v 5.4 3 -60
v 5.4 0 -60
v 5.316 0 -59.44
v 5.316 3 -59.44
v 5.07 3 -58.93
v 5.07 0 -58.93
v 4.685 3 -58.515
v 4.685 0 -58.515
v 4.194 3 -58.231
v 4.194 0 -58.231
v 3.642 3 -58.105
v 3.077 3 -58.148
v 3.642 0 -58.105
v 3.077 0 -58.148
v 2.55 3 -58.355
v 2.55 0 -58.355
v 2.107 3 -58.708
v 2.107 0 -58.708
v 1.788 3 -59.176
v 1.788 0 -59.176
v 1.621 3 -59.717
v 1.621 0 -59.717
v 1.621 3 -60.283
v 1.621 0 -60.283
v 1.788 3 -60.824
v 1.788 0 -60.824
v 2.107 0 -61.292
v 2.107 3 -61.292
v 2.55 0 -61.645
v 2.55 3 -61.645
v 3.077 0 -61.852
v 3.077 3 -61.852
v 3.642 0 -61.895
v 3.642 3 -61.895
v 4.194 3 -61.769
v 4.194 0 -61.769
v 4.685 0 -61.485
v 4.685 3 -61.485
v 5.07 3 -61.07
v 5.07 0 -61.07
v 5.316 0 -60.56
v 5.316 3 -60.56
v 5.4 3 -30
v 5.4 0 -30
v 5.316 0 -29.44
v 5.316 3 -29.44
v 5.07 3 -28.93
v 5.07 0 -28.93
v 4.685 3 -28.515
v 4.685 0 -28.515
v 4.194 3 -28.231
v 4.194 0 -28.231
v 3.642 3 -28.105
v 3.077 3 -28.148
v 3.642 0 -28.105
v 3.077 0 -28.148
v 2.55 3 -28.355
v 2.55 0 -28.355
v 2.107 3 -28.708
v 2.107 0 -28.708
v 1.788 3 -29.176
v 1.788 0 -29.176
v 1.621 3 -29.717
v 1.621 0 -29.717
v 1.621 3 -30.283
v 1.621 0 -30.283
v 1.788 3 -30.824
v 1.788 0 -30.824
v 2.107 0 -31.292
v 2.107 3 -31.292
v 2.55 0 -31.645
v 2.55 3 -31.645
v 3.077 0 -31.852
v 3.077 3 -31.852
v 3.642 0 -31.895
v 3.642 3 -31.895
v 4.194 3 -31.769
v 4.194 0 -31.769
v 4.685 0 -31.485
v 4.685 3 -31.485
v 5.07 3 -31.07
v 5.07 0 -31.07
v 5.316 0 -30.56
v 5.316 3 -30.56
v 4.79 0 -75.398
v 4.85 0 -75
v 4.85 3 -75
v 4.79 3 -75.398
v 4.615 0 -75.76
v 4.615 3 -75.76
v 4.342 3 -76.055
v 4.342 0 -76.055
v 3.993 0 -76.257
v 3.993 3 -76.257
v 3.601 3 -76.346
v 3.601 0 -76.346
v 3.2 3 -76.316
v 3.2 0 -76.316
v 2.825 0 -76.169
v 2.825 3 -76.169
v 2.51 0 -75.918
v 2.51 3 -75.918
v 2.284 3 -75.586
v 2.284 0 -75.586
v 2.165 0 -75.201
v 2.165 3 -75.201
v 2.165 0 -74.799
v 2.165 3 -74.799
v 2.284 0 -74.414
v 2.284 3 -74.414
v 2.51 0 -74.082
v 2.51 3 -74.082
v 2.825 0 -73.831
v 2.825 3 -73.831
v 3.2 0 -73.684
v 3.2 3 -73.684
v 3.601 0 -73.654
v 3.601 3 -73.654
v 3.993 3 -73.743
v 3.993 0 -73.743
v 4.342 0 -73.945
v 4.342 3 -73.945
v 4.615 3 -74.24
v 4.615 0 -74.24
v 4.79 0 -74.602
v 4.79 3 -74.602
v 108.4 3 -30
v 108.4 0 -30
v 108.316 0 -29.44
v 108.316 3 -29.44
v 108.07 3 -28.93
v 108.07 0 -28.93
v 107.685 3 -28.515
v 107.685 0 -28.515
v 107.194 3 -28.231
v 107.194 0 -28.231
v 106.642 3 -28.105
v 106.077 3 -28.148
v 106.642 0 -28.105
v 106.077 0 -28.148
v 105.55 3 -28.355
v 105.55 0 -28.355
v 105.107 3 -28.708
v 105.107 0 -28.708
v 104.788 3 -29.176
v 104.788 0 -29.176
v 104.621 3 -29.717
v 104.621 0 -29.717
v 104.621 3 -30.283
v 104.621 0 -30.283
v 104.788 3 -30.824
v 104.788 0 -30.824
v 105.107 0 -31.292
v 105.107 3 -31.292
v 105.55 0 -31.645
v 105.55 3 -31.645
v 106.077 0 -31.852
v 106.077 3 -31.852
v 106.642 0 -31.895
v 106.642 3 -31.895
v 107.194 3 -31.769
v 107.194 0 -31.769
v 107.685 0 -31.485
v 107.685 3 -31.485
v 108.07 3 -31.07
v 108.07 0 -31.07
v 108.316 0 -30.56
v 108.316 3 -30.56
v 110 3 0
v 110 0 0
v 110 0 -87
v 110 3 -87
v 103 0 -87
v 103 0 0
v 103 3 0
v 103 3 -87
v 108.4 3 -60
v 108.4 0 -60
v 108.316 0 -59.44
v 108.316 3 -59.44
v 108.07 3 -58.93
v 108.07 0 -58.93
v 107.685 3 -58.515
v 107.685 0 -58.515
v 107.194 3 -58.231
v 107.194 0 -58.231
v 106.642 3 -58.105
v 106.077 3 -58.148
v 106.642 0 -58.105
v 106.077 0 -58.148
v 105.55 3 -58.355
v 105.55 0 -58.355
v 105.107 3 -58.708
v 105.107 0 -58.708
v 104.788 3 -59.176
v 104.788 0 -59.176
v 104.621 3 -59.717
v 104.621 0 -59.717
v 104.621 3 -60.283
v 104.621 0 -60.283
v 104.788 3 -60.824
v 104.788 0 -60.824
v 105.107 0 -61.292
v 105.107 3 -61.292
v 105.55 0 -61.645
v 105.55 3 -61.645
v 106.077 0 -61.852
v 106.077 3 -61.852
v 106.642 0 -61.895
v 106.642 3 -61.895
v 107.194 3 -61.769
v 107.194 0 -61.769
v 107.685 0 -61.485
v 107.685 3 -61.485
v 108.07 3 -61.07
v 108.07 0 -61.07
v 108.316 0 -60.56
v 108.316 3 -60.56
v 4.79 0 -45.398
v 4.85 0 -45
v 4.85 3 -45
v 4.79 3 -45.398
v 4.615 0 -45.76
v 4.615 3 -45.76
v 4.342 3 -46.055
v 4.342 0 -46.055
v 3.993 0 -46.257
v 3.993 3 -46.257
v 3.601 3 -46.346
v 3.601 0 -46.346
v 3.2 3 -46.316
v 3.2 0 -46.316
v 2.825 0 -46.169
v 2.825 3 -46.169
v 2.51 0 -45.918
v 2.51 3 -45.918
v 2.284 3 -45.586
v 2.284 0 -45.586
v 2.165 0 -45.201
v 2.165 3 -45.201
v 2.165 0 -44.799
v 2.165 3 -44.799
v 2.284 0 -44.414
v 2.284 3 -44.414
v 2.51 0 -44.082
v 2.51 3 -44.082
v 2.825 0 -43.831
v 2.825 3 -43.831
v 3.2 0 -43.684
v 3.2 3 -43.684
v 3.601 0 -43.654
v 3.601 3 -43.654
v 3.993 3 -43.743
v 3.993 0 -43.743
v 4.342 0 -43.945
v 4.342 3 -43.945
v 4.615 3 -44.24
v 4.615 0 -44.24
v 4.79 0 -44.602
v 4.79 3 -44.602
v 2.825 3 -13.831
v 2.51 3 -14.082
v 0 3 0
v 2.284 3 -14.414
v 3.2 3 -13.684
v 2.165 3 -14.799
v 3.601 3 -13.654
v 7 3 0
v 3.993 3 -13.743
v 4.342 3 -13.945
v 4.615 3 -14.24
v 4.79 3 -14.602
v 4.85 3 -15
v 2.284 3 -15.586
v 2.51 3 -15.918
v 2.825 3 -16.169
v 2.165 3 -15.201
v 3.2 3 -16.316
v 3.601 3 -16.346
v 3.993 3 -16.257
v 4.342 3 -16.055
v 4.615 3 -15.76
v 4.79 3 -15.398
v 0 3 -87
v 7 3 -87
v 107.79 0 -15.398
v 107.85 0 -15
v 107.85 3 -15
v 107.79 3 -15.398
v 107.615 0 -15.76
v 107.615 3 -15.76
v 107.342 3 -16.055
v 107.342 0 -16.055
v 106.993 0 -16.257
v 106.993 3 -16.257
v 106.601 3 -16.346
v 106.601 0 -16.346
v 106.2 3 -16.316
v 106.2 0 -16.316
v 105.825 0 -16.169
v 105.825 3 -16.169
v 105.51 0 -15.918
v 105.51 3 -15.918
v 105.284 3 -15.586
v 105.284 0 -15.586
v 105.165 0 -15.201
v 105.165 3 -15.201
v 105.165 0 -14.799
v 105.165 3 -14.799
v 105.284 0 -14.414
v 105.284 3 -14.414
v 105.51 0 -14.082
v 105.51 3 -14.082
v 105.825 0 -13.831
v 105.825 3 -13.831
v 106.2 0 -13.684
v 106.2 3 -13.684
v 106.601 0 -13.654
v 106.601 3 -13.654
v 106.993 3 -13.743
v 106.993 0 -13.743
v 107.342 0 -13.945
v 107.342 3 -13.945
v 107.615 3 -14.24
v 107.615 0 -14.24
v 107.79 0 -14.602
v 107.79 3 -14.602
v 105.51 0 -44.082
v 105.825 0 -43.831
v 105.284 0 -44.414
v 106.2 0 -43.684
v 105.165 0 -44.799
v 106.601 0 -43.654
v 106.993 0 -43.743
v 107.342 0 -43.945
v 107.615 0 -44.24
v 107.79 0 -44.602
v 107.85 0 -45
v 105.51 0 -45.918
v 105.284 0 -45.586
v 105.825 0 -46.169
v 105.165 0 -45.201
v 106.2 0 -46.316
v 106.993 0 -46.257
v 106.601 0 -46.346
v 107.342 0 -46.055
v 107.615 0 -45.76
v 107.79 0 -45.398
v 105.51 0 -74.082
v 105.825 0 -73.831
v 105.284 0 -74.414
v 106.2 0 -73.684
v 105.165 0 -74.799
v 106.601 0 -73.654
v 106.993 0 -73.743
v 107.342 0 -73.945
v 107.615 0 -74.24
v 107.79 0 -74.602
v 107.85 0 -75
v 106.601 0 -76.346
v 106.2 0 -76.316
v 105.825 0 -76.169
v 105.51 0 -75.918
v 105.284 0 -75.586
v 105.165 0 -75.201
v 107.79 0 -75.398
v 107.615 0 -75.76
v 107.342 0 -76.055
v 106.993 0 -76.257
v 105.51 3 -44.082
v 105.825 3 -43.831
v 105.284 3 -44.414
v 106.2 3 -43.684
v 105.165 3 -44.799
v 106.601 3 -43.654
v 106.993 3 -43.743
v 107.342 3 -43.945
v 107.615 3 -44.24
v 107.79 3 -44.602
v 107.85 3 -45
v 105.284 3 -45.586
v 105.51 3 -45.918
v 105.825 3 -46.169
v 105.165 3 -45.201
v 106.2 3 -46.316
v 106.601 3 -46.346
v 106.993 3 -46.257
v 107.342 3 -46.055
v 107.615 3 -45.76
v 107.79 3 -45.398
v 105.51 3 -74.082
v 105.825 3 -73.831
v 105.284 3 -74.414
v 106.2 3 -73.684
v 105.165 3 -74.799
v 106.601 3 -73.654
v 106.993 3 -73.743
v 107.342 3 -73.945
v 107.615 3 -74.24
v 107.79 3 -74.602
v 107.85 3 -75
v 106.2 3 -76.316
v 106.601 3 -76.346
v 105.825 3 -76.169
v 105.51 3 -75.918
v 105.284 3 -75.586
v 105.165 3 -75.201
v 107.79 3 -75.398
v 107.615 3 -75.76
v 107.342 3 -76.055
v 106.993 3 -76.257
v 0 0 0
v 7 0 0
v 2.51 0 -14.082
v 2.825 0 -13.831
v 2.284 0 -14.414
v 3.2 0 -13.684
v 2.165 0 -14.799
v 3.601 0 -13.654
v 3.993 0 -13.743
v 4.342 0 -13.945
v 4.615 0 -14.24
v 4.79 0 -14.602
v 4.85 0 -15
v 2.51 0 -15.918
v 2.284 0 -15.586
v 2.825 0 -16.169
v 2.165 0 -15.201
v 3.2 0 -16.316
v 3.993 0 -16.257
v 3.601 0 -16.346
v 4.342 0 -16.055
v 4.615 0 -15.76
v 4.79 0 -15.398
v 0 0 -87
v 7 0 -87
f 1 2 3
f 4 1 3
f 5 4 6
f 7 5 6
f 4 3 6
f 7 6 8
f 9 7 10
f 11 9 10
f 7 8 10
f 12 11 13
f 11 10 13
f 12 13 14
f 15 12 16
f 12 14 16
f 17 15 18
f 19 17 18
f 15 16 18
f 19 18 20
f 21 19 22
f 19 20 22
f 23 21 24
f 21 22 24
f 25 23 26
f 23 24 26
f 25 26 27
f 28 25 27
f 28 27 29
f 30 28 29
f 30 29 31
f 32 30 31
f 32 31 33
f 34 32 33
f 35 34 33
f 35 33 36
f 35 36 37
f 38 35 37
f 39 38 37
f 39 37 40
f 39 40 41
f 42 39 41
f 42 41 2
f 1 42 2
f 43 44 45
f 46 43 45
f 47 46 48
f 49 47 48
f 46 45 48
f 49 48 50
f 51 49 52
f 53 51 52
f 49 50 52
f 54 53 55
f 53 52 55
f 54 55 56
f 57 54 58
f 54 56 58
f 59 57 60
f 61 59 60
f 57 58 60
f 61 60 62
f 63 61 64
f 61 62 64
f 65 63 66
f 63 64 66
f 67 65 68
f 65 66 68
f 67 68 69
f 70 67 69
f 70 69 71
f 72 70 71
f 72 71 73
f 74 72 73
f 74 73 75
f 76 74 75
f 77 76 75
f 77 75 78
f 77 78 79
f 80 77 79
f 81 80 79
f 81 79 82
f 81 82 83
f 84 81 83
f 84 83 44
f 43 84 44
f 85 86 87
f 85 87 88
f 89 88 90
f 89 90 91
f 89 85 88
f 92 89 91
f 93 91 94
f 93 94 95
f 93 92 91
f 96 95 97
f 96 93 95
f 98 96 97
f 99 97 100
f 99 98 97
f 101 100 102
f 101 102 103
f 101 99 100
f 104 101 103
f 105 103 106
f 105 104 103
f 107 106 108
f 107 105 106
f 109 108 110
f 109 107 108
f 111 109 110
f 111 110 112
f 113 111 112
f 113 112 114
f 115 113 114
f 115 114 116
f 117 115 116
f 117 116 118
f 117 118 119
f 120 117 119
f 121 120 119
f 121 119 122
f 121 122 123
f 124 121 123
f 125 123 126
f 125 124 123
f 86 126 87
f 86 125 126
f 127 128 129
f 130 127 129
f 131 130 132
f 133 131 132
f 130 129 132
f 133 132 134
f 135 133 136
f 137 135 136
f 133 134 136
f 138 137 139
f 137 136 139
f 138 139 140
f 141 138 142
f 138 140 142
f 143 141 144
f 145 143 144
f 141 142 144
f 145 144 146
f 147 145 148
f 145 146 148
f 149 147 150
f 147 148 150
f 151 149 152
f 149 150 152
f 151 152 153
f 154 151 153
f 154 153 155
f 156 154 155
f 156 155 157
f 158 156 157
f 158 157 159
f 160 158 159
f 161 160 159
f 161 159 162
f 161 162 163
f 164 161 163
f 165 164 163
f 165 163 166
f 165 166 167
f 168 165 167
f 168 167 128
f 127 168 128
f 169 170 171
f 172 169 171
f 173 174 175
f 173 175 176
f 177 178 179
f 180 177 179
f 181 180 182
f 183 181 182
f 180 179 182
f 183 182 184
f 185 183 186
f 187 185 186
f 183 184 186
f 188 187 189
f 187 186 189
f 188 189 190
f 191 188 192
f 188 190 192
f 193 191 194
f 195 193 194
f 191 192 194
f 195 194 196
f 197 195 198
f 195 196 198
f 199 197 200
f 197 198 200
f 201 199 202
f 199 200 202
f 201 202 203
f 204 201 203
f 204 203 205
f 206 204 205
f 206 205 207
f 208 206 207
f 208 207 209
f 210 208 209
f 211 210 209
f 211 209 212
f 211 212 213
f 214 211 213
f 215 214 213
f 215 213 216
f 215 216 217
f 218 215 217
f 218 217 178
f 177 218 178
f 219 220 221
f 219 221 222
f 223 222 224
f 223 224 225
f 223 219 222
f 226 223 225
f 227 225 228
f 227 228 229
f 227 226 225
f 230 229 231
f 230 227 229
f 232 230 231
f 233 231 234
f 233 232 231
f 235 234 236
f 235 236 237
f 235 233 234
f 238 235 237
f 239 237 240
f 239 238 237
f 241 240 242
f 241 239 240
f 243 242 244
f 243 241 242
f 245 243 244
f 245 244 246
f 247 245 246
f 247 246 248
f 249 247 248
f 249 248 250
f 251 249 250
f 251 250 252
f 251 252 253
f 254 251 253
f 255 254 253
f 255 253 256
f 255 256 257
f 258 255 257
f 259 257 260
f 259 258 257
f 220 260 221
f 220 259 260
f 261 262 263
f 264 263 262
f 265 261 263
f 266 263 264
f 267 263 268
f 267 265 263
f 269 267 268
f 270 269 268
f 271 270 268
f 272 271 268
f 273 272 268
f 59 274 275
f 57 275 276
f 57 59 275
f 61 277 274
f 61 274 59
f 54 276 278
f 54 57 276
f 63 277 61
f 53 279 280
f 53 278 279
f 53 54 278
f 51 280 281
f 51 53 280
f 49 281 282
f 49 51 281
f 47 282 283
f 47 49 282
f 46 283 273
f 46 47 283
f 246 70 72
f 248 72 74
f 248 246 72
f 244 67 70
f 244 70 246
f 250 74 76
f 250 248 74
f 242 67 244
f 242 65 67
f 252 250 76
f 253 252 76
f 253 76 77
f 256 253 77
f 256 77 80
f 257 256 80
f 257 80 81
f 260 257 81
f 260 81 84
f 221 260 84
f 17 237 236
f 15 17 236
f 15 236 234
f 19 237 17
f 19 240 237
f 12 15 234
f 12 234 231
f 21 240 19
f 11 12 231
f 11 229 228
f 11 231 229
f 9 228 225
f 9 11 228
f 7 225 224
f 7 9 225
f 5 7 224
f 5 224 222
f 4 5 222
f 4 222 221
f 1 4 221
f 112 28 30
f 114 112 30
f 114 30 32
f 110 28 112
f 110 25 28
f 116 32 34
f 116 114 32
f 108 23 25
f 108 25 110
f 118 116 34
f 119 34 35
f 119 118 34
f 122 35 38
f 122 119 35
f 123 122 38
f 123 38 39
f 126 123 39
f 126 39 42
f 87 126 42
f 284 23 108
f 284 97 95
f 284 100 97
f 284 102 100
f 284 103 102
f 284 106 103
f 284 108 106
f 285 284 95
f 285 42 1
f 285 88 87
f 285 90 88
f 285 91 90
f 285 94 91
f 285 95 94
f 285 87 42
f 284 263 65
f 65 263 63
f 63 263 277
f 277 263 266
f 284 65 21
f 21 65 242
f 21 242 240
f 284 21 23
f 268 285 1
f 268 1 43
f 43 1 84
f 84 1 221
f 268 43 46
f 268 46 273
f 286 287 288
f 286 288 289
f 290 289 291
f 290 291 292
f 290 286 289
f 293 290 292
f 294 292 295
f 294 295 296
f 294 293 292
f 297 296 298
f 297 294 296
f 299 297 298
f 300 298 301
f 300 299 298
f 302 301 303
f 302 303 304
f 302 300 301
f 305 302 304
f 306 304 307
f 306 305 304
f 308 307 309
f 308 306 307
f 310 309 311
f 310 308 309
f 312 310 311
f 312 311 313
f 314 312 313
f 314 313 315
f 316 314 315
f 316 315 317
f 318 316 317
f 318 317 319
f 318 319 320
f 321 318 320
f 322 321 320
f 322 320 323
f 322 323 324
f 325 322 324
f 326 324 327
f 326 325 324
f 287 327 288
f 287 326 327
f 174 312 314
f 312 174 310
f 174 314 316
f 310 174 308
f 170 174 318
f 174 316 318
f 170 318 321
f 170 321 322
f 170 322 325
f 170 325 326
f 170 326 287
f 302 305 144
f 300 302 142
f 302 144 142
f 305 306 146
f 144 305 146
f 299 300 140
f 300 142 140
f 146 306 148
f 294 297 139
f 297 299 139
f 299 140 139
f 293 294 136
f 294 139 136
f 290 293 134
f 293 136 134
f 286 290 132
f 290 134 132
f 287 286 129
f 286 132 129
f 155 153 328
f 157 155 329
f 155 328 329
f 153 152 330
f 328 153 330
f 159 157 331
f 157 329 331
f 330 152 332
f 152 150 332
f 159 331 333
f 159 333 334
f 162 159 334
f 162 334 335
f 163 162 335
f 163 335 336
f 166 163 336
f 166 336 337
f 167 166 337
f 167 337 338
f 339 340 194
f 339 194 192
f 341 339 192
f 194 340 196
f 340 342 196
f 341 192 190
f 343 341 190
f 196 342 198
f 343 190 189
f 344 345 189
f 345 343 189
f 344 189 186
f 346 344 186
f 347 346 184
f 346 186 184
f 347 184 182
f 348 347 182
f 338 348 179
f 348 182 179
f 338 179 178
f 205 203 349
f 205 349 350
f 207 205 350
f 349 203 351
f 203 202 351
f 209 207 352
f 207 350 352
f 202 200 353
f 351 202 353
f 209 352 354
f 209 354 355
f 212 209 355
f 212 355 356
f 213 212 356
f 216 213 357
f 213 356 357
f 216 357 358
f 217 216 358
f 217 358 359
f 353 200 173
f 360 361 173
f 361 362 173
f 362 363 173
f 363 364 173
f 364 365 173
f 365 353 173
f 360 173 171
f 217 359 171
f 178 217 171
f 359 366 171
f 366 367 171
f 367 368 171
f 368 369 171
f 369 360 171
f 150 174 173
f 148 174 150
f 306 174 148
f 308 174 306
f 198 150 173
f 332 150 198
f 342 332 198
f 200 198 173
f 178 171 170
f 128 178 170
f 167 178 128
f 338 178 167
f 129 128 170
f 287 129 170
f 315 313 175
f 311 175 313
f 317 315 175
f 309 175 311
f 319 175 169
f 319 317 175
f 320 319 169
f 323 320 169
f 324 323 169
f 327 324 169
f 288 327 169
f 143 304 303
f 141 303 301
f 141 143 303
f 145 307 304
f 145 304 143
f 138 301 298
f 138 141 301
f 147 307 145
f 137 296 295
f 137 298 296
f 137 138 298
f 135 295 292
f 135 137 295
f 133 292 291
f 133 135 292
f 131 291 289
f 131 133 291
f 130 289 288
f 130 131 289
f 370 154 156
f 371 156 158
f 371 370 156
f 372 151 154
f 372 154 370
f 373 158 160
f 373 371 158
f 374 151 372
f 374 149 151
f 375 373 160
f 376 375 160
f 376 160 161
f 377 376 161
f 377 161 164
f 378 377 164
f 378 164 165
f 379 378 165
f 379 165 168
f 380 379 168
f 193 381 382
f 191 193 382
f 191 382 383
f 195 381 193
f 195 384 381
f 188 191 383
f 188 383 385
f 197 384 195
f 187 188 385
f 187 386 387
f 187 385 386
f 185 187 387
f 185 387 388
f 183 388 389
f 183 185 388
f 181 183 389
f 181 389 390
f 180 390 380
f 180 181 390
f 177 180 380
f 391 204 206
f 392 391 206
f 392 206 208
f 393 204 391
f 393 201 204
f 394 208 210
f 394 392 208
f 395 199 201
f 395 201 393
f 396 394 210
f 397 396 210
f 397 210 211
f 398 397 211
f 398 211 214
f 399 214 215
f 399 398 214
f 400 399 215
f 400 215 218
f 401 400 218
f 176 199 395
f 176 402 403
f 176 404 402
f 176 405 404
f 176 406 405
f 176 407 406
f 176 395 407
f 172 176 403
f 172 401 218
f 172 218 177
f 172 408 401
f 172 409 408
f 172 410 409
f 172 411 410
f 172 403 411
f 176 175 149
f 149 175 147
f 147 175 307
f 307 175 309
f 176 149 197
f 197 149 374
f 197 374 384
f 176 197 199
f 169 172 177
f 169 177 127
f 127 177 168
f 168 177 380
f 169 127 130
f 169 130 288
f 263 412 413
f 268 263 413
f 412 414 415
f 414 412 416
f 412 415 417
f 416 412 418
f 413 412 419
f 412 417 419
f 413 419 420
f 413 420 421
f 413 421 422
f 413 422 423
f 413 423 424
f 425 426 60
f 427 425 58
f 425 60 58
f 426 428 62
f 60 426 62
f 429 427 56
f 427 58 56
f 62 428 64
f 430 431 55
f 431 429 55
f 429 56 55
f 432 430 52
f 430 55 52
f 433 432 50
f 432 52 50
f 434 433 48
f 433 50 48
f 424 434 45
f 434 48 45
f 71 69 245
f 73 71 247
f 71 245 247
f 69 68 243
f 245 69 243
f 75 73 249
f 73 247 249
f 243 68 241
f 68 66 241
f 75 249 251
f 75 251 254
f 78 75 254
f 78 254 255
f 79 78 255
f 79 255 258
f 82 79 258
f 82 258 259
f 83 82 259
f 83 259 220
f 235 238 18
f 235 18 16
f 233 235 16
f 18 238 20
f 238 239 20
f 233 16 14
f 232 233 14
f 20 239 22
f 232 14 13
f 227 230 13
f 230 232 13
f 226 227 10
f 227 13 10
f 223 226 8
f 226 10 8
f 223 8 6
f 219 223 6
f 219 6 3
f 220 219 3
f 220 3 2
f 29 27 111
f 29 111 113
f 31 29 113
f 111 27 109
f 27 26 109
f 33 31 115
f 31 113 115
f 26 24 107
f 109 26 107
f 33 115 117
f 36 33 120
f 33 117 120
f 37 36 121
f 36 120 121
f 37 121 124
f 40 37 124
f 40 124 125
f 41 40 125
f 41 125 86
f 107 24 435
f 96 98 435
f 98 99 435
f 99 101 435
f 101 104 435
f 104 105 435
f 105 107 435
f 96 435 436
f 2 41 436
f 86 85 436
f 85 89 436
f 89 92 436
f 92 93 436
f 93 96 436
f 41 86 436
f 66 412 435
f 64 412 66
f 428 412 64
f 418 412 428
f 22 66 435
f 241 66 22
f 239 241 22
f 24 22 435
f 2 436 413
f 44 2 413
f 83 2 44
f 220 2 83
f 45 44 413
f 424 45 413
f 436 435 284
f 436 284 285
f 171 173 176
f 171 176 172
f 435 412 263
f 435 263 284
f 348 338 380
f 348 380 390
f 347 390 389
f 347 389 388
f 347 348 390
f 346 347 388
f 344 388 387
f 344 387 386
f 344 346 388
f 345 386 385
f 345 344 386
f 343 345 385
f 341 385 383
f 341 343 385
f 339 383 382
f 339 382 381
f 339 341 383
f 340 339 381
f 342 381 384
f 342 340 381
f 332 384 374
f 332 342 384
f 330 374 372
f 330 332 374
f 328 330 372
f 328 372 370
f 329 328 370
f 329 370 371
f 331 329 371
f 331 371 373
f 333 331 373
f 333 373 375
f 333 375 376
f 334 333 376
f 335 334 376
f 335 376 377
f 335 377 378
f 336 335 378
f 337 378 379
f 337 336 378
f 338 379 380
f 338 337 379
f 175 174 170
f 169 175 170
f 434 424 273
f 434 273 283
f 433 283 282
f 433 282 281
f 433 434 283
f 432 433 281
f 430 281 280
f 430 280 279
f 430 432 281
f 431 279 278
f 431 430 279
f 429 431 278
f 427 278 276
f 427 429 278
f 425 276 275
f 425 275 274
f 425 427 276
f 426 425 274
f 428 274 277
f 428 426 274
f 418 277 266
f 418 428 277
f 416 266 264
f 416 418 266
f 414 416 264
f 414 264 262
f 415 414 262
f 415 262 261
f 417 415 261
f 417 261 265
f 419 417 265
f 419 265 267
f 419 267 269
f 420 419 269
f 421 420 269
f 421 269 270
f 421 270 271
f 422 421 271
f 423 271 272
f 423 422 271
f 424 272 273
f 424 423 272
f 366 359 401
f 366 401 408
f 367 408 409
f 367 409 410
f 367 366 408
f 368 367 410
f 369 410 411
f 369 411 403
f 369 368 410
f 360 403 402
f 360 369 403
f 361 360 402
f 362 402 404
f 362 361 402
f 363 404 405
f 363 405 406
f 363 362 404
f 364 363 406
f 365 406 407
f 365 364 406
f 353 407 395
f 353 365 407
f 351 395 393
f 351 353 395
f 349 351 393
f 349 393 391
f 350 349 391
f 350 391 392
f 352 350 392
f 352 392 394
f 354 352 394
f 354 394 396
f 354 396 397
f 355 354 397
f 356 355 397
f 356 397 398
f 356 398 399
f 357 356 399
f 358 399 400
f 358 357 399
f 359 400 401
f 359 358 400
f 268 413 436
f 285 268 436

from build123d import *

# Parameters (mm, degrees)
SKETCH1_W            = 7
SKETCH1_H            = 87
SKETCH1_R            = 1.35
SPACER_RAILS_DEPTH   = 3
SPACER_RAILS_2_DEPTH = 3
SKETCH2_R            = 1.9
CUT_EXTRUDE2_DEPTH   = 4


with BuildPart() as part:
    # Sketch1 → spacer-rails (new body)
    with BuildSketch(Plane(origin=(0, 0, 0), x_dir=(1, 0, 0), z_dir=(0, 1, 0))):
        with Locations((3.5, 43.5)):
            Rectangle(SKETCH1_W, SKETCH1_H)
        with Locations((3.5, 15)):
            Circle(SKETCH1_R, mode=Mode.SUBTRACT)
        with Locations((3.5, 30)):
            Circle(SKETCH1_R, mode=Mode.SUBTRACT)
        with Locations((3.5, 45)):
            Circle(SKETCH1_R, mode=Mode.SUBTRACT)
        with Locations((3.5, 60)):
            Circle(SKETCH1_R, mode=Mode.SUBTRACT)
        with Locations((3.5, 75)):
            Circle(SKETCH1_R, mode=Mode.SUBTRACT)
    extrude(amount=SPACER_RAILS_DEPTH)


with BuildPart() as body_2:
    # Sketch1 → spacer-rails 2 (new body)
    with BuildSketch(Plane(origin=(0, 0, 0), x_dir=(1, 0, 0), z_dir=(0, 1, 0))):
        with Locations((106.5, 43.5)):
            Rectangle(SKETCH1_W, SKETCH1_H)
        with Locations((106.5, 15)):
            Circle(SKETCH1_R, mode=Mode.SUBTRACT)
        with Locations((106.5, 30)):
            Circle(SKETCH1_R, mode=Mode.SUBTRACT)
        with Locations((106.5, 75)):
            Circle(SKETCH1_R, mode=Mode.SUBTRACT)
        with Locations((106.5, 60)):
            Circle(SKETCH1_R, mode=Mode.SUBTRACT)
        with Locations((106.5, 45)):
            Circle(SKETCH1_R, mode=Mode.SUBTRACT)
    extrude(amount=SPACER_RAILS_2_DEPTH)


with BuildPart() as cut_extrude2_tool:
    # Sketch2 → Cut-Extrude2 (new body, through all)
    with BuildSketch(Plane.XZ):
        with Locations((3.5, -30)):
            Circle(SKETCH2_R)
        with Locations((106.5, -30)):
            Circle(SKETCH2_R)
        with Locations((106.5, -60)):
            Circle(SKETCH2_R)
        with Locations((3.5, -60)):
            Circle(SKETCH2_R)
    extrude(amount=-CUT_EXTRUDE2_DEPTH)


with BuildPart() as part_1:
    add(part.part)

    # Cut-Extrude2: cut by cut_extrude2_tool
    add(cut_extrude2_tool.part, mode=Mode.SUBTRACT)


with BuildPart() as body_2_1:
    add(body_2.part)

    # Cut-Extrude2: cut by cut_extrude2_tool
    add(cut_extrude2_tool.part, mode=Mode.SUBTRACT)


solid = Compound([part_1.part, body_2_1.part])
